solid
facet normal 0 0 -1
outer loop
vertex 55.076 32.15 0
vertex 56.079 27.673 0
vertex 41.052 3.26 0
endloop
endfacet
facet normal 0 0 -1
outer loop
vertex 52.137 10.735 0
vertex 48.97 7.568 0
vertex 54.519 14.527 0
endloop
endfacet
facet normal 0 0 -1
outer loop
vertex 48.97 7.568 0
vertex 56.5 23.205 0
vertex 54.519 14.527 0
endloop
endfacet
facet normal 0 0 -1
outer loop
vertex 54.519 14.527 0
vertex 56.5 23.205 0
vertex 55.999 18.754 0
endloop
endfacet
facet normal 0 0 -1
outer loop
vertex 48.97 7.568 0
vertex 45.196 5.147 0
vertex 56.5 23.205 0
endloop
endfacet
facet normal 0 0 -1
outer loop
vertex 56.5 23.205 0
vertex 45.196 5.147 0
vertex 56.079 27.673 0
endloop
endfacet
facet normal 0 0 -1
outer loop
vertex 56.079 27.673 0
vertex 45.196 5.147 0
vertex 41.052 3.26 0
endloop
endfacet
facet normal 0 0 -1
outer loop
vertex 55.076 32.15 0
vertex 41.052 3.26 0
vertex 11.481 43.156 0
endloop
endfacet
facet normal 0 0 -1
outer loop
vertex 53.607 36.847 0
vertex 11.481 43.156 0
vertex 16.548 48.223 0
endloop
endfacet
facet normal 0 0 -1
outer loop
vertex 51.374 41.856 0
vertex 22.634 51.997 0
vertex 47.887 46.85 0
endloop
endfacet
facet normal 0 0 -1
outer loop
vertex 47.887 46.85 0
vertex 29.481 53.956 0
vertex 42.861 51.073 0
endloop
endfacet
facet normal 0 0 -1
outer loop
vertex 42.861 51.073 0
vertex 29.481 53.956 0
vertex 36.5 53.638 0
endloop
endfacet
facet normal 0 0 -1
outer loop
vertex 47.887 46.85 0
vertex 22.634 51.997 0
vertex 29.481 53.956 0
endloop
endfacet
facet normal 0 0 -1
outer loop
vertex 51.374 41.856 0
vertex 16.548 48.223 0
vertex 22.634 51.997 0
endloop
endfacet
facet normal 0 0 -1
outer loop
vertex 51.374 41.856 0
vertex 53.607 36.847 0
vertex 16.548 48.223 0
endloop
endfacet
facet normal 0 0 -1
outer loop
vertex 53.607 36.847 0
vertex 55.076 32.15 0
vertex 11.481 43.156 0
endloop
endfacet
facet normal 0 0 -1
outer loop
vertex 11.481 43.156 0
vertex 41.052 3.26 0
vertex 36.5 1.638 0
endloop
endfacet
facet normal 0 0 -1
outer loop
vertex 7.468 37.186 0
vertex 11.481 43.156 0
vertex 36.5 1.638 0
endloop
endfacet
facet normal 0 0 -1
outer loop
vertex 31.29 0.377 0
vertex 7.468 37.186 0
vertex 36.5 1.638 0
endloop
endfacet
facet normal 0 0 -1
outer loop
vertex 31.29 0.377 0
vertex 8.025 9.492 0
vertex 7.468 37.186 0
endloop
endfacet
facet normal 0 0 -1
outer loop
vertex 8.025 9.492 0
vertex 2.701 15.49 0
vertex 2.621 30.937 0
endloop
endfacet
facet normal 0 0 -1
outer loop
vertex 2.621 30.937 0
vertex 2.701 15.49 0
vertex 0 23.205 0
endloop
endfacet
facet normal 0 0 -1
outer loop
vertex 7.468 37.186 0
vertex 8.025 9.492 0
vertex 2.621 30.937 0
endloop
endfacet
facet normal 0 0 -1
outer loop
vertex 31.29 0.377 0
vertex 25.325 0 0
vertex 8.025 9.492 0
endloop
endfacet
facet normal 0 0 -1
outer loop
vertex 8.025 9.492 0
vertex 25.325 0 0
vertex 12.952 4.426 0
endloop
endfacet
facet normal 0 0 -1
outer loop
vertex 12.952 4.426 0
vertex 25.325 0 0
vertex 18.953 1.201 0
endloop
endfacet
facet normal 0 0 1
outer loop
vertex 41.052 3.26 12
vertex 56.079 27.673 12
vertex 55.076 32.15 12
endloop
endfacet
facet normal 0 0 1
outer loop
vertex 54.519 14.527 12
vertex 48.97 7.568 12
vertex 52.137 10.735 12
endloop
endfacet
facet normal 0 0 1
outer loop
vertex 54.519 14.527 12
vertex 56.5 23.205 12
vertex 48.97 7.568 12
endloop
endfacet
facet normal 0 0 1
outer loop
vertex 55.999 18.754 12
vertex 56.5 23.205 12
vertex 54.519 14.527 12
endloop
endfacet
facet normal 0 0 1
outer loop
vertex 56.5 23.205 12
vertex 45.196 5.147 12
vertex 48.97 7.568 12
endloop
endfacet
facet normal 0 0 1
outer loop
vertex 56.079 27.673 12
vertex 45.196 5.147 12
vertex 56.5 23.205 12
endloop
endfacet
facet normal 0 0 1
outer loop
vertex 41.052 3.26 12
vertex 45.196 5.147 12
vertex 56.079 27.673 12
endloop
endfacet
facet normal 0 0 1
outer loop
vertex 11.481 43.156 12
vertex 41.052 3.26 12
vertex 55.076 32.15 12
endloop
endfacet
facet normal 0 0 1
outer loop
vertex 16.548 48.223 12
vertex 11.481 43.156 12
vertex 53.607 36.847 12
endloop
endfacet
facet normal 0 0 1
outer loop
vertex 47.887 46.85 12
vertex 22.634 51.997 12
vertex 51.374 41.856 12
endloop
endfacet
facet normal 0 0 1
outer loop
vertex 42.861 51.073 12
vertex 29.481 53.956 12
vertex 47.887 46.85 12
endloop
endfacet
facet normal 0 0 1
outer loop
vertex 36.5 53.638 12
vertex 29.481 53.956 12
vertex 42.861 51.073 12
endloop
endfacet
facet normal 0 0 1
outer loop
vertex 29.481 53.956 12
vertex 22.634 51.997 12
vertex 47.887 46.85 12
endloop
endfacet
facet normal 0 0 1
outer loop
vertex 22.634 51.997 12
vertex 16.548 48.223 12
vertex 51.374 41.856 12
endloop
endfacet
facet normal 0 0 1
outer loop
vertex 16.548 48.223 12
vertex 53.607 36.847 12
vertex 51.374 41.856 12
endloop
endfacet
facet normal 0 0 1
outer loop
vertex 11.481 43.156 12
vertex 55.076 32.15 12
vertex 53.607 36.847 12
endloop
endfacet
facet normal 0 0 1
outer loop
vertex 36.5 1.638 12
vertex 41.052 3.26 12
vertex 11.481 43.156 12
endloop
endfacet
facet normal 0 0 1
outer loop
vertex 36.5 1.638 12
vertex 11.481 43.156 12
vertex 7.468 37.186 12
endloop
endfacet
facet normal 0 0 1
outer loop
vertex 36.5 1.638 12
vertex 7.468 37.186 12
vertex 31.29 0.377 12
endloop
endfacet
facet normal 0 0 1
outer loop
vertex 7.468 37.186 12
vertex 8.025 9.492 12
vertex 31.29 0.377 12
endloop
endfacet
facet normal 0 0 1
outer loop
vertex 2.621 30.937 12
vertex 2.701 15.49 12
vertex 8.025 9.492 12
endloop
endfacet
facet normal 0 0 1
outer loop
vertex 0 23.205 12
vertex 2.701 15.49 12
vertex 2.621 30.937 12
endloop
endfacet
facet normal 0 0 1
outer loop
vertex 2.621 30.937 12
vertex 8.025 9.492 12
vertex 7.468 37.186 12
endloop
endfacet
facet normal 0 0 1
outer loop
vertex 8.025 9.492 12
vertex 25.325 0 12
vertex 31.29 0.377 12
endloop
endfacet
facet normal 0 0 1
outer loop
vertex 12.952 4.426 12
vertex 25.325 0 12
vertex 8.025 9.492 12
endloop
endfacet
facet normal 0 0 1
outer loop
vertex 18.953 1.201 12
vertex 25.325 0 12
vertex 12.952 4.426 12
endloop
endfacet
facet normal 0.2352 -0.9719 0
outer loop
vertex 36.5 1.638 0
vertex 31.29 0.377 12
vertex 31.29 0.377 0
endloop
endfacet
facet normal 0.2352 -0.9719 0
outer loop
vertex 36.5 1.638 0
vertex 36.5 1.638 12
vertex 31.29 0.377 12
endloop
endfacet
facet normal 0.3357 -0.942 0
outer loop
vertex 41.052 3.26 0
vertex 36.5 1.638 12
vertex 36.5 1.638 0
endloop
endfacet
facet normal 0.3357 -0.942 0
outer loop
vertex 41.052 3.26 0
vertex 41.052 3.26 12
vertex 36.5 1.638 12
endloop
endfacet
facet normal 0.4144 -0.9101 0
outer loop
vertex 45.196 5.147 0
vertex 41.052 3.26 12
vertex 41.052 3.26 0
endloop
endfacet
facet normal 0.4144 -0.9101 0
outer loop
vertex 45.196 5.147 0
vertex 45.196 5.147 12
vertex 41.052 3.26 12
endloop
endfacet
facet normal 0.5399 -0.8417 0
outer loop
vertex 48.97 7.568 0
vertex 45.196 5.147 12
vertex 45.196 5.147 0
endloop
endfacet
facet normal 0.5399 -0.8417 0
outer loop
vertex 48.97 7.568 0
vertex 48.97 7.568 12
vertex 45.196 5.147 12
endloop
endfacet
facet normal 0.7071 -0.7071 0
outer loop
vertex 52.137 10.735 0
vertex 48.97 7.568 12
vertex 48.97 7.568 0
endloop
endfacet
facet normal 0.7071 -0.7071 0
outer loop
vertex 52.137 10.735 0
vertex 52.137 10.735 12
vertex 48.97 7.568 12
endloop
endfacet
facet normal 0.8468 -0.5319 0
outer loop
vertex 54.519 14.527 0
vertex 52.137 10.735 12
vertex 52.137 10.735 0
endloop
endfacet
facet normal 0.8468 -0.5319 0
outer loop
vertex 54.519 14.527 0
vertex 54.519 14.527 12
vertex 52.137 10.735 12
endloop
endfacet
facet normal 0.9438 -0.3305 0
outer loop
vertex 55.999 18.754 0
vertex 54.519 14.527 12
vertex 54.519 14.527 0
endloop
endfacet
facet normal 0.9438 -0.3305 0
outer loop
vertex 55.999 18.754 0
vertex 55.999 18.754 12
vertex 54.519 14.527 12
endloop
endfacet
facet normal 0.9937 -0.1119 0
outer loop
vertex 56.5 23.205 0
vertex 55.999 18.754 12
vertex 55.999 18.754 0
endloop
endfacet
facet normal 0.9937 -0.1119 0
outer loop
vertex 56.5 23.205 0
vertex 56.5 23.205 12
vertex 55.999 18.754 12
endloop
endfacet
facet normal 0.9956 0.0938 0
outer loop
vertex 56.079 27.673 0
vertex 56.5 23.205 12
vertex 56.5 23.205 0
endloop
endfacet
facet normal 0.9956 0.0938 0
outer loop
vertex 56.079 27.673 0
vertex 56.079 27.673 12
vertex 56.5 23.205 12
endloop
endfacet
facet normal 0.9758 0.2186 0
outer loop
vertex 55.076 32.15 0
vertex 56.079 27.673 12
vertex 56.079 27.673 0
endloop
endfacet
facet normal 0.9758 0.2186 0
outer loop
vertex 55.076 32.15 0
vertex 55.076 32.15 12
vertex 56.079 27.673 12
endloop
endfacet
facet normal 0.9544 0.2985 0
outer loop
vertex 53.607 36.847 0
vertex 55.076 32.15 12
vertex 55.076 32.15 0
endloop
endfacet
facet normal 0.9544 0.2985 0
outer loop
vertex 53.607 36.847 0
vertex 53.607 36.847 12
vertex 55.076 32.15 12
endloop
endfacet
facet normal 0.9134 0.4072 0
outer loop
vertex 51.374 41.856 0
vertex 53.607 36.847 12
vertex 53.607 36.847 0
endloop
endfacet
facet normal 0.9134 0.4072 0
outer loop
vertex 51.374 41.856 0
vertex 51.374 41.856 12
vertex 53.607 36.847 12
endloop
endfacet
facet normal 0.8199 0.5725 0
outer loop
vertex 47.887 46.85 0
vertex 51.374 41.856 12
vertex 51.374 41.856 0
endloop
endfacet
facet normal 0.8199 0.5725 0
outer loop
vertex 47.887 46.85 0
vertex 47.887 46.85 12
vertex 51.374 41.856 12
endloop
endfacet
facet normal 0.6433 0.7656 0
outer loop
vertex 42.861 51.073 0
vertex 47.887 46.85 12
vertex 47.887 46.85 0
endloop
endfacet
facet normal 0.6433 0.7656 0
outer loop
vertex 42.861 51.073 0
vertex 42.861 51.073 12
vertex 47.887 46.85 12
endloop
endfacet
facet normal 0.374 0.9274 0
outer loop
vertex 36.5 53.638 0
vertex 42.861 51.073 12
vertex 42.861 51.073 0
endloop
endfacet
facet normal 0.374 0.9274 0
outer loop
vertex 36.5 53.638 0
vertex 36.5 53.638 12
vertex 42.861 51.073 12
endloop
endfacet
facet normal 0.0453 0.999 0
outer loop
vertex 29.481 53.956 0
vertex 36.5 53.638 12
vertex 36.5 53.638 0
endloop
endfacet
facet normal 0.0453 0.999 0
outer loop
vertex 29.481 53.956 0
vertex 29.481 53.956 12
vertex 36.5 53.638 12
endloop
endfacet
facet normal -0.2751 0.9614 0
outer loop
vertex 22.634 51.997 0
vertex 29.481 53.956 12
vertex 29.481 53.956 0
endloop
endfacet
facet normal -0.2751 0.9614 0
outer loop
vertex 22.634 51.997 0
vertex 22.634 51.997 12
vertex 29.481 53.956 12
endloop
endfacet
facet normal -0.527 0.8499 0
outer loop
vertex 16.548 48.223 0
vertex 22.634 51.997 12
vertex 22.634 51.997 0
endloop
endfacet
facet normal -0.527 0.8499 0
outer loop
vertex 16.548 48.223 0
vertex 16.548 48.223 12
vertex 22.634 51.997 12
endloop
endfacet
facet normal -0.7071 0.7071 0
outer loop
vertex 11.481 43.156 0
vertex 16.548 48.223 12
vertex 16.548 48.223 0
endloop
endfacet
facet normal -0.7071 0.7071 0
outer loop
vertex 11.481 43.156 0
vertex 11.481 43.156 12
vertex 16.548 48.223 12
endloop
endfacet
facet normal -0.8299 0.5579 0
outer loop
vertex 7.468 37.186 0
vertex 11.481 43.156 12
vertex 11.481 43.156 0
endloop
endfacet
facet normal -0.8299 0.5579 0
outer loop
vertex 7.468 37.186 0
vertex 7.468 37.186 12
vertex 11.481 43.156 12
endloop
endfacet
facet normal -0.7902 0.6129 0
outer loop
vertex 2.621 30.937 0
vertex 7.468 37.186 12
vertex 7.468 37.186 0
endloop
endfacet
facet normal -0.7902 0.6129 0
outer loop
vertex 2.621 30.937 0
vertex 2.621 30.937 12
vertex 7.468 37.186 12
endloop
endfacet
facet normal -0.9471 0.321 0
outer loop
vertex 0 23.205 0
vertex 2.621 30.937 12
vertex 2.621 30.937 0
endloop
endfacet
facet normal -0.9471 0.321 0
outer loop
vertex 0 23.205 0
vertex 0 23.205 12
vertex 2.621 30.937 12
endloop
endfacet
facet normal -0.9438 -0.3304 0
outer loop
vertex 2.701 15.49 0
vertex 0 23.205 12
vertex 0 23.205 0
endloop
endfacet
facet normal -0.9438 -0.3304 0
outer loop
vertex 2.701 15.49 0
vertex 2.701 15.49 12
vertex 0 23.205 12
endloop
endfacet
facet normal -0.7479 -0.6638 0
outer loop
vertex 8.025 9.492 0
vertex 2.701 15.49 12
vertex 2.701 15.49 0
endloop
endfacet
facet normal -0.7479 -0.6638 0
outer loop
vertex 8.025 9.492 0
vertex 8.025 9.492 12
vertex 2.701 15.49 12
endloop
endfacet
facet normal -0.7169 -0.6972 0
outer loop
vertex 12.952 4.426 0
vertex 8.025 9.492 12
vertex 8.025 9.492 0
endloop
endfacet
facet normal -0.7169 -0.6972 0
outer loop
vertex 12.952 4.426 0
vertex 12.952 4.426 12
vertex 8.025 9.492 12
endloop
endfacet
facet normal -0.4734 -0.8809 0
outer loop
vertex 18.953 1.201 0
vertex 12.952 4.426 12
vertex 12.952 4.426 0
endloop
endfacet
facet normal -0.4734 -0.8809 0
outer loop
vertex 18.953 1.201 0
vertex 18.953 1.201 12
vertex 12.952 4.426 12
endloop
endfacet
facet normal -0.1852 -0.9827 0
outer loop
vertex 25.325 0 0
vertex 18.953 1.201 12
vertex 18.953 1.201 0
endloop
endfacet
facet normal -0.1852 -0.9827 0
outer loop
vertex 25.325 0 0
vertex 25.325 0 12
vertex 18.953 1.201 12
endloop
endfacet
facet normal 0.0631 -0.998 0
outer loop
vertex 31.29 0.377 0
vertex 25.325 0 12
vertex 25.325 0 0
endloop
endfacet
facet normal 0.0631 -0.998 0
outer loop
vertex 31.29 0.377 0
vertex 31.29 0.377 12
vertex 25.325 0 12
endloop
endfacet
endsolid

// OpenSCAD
$fn = 32;

// ----------------------------------------------------------------------
// Cam disc: base radius 20.0 mm, lift 12.0 mm, 28 profile points
// ----------------------------------------------------------------------

// --- parameters (mm) ---
profile_height = 12;      // extrusion height
profile_points = 28;      // points of the closed outline

profile = [[56.5, 23.205], [56.079, 27.673], [55.076, 32.15], [53.607, 36.847], [51.374, 41.856], [47.887, 46.85], [42.861, 51.073], [36.5, 53.638], [29.481, 53.956], [22.634, 51.997], [16.548, 48.223], [11.481, 43.156], [7.468, 37.186], [2.621, 30.937], [0, 23.205], [2.701, 15.49], [8.025, 9.492], [12.952, 4.426], [18.953, 1.201], [25.325, 0], [31.29, 0.377], [36.5, 1.638], [41.052, 3.26], [45.196, 5.147], [48.97, 7.568], [52.137, 10.735], [54.519, 14.527], [55.999, 18.754]];  // single closed polygon, 28 points, counter clockwise

// --- the one profile operation ---
linear_extrude(height = profile_height) polygon(points = profile);
